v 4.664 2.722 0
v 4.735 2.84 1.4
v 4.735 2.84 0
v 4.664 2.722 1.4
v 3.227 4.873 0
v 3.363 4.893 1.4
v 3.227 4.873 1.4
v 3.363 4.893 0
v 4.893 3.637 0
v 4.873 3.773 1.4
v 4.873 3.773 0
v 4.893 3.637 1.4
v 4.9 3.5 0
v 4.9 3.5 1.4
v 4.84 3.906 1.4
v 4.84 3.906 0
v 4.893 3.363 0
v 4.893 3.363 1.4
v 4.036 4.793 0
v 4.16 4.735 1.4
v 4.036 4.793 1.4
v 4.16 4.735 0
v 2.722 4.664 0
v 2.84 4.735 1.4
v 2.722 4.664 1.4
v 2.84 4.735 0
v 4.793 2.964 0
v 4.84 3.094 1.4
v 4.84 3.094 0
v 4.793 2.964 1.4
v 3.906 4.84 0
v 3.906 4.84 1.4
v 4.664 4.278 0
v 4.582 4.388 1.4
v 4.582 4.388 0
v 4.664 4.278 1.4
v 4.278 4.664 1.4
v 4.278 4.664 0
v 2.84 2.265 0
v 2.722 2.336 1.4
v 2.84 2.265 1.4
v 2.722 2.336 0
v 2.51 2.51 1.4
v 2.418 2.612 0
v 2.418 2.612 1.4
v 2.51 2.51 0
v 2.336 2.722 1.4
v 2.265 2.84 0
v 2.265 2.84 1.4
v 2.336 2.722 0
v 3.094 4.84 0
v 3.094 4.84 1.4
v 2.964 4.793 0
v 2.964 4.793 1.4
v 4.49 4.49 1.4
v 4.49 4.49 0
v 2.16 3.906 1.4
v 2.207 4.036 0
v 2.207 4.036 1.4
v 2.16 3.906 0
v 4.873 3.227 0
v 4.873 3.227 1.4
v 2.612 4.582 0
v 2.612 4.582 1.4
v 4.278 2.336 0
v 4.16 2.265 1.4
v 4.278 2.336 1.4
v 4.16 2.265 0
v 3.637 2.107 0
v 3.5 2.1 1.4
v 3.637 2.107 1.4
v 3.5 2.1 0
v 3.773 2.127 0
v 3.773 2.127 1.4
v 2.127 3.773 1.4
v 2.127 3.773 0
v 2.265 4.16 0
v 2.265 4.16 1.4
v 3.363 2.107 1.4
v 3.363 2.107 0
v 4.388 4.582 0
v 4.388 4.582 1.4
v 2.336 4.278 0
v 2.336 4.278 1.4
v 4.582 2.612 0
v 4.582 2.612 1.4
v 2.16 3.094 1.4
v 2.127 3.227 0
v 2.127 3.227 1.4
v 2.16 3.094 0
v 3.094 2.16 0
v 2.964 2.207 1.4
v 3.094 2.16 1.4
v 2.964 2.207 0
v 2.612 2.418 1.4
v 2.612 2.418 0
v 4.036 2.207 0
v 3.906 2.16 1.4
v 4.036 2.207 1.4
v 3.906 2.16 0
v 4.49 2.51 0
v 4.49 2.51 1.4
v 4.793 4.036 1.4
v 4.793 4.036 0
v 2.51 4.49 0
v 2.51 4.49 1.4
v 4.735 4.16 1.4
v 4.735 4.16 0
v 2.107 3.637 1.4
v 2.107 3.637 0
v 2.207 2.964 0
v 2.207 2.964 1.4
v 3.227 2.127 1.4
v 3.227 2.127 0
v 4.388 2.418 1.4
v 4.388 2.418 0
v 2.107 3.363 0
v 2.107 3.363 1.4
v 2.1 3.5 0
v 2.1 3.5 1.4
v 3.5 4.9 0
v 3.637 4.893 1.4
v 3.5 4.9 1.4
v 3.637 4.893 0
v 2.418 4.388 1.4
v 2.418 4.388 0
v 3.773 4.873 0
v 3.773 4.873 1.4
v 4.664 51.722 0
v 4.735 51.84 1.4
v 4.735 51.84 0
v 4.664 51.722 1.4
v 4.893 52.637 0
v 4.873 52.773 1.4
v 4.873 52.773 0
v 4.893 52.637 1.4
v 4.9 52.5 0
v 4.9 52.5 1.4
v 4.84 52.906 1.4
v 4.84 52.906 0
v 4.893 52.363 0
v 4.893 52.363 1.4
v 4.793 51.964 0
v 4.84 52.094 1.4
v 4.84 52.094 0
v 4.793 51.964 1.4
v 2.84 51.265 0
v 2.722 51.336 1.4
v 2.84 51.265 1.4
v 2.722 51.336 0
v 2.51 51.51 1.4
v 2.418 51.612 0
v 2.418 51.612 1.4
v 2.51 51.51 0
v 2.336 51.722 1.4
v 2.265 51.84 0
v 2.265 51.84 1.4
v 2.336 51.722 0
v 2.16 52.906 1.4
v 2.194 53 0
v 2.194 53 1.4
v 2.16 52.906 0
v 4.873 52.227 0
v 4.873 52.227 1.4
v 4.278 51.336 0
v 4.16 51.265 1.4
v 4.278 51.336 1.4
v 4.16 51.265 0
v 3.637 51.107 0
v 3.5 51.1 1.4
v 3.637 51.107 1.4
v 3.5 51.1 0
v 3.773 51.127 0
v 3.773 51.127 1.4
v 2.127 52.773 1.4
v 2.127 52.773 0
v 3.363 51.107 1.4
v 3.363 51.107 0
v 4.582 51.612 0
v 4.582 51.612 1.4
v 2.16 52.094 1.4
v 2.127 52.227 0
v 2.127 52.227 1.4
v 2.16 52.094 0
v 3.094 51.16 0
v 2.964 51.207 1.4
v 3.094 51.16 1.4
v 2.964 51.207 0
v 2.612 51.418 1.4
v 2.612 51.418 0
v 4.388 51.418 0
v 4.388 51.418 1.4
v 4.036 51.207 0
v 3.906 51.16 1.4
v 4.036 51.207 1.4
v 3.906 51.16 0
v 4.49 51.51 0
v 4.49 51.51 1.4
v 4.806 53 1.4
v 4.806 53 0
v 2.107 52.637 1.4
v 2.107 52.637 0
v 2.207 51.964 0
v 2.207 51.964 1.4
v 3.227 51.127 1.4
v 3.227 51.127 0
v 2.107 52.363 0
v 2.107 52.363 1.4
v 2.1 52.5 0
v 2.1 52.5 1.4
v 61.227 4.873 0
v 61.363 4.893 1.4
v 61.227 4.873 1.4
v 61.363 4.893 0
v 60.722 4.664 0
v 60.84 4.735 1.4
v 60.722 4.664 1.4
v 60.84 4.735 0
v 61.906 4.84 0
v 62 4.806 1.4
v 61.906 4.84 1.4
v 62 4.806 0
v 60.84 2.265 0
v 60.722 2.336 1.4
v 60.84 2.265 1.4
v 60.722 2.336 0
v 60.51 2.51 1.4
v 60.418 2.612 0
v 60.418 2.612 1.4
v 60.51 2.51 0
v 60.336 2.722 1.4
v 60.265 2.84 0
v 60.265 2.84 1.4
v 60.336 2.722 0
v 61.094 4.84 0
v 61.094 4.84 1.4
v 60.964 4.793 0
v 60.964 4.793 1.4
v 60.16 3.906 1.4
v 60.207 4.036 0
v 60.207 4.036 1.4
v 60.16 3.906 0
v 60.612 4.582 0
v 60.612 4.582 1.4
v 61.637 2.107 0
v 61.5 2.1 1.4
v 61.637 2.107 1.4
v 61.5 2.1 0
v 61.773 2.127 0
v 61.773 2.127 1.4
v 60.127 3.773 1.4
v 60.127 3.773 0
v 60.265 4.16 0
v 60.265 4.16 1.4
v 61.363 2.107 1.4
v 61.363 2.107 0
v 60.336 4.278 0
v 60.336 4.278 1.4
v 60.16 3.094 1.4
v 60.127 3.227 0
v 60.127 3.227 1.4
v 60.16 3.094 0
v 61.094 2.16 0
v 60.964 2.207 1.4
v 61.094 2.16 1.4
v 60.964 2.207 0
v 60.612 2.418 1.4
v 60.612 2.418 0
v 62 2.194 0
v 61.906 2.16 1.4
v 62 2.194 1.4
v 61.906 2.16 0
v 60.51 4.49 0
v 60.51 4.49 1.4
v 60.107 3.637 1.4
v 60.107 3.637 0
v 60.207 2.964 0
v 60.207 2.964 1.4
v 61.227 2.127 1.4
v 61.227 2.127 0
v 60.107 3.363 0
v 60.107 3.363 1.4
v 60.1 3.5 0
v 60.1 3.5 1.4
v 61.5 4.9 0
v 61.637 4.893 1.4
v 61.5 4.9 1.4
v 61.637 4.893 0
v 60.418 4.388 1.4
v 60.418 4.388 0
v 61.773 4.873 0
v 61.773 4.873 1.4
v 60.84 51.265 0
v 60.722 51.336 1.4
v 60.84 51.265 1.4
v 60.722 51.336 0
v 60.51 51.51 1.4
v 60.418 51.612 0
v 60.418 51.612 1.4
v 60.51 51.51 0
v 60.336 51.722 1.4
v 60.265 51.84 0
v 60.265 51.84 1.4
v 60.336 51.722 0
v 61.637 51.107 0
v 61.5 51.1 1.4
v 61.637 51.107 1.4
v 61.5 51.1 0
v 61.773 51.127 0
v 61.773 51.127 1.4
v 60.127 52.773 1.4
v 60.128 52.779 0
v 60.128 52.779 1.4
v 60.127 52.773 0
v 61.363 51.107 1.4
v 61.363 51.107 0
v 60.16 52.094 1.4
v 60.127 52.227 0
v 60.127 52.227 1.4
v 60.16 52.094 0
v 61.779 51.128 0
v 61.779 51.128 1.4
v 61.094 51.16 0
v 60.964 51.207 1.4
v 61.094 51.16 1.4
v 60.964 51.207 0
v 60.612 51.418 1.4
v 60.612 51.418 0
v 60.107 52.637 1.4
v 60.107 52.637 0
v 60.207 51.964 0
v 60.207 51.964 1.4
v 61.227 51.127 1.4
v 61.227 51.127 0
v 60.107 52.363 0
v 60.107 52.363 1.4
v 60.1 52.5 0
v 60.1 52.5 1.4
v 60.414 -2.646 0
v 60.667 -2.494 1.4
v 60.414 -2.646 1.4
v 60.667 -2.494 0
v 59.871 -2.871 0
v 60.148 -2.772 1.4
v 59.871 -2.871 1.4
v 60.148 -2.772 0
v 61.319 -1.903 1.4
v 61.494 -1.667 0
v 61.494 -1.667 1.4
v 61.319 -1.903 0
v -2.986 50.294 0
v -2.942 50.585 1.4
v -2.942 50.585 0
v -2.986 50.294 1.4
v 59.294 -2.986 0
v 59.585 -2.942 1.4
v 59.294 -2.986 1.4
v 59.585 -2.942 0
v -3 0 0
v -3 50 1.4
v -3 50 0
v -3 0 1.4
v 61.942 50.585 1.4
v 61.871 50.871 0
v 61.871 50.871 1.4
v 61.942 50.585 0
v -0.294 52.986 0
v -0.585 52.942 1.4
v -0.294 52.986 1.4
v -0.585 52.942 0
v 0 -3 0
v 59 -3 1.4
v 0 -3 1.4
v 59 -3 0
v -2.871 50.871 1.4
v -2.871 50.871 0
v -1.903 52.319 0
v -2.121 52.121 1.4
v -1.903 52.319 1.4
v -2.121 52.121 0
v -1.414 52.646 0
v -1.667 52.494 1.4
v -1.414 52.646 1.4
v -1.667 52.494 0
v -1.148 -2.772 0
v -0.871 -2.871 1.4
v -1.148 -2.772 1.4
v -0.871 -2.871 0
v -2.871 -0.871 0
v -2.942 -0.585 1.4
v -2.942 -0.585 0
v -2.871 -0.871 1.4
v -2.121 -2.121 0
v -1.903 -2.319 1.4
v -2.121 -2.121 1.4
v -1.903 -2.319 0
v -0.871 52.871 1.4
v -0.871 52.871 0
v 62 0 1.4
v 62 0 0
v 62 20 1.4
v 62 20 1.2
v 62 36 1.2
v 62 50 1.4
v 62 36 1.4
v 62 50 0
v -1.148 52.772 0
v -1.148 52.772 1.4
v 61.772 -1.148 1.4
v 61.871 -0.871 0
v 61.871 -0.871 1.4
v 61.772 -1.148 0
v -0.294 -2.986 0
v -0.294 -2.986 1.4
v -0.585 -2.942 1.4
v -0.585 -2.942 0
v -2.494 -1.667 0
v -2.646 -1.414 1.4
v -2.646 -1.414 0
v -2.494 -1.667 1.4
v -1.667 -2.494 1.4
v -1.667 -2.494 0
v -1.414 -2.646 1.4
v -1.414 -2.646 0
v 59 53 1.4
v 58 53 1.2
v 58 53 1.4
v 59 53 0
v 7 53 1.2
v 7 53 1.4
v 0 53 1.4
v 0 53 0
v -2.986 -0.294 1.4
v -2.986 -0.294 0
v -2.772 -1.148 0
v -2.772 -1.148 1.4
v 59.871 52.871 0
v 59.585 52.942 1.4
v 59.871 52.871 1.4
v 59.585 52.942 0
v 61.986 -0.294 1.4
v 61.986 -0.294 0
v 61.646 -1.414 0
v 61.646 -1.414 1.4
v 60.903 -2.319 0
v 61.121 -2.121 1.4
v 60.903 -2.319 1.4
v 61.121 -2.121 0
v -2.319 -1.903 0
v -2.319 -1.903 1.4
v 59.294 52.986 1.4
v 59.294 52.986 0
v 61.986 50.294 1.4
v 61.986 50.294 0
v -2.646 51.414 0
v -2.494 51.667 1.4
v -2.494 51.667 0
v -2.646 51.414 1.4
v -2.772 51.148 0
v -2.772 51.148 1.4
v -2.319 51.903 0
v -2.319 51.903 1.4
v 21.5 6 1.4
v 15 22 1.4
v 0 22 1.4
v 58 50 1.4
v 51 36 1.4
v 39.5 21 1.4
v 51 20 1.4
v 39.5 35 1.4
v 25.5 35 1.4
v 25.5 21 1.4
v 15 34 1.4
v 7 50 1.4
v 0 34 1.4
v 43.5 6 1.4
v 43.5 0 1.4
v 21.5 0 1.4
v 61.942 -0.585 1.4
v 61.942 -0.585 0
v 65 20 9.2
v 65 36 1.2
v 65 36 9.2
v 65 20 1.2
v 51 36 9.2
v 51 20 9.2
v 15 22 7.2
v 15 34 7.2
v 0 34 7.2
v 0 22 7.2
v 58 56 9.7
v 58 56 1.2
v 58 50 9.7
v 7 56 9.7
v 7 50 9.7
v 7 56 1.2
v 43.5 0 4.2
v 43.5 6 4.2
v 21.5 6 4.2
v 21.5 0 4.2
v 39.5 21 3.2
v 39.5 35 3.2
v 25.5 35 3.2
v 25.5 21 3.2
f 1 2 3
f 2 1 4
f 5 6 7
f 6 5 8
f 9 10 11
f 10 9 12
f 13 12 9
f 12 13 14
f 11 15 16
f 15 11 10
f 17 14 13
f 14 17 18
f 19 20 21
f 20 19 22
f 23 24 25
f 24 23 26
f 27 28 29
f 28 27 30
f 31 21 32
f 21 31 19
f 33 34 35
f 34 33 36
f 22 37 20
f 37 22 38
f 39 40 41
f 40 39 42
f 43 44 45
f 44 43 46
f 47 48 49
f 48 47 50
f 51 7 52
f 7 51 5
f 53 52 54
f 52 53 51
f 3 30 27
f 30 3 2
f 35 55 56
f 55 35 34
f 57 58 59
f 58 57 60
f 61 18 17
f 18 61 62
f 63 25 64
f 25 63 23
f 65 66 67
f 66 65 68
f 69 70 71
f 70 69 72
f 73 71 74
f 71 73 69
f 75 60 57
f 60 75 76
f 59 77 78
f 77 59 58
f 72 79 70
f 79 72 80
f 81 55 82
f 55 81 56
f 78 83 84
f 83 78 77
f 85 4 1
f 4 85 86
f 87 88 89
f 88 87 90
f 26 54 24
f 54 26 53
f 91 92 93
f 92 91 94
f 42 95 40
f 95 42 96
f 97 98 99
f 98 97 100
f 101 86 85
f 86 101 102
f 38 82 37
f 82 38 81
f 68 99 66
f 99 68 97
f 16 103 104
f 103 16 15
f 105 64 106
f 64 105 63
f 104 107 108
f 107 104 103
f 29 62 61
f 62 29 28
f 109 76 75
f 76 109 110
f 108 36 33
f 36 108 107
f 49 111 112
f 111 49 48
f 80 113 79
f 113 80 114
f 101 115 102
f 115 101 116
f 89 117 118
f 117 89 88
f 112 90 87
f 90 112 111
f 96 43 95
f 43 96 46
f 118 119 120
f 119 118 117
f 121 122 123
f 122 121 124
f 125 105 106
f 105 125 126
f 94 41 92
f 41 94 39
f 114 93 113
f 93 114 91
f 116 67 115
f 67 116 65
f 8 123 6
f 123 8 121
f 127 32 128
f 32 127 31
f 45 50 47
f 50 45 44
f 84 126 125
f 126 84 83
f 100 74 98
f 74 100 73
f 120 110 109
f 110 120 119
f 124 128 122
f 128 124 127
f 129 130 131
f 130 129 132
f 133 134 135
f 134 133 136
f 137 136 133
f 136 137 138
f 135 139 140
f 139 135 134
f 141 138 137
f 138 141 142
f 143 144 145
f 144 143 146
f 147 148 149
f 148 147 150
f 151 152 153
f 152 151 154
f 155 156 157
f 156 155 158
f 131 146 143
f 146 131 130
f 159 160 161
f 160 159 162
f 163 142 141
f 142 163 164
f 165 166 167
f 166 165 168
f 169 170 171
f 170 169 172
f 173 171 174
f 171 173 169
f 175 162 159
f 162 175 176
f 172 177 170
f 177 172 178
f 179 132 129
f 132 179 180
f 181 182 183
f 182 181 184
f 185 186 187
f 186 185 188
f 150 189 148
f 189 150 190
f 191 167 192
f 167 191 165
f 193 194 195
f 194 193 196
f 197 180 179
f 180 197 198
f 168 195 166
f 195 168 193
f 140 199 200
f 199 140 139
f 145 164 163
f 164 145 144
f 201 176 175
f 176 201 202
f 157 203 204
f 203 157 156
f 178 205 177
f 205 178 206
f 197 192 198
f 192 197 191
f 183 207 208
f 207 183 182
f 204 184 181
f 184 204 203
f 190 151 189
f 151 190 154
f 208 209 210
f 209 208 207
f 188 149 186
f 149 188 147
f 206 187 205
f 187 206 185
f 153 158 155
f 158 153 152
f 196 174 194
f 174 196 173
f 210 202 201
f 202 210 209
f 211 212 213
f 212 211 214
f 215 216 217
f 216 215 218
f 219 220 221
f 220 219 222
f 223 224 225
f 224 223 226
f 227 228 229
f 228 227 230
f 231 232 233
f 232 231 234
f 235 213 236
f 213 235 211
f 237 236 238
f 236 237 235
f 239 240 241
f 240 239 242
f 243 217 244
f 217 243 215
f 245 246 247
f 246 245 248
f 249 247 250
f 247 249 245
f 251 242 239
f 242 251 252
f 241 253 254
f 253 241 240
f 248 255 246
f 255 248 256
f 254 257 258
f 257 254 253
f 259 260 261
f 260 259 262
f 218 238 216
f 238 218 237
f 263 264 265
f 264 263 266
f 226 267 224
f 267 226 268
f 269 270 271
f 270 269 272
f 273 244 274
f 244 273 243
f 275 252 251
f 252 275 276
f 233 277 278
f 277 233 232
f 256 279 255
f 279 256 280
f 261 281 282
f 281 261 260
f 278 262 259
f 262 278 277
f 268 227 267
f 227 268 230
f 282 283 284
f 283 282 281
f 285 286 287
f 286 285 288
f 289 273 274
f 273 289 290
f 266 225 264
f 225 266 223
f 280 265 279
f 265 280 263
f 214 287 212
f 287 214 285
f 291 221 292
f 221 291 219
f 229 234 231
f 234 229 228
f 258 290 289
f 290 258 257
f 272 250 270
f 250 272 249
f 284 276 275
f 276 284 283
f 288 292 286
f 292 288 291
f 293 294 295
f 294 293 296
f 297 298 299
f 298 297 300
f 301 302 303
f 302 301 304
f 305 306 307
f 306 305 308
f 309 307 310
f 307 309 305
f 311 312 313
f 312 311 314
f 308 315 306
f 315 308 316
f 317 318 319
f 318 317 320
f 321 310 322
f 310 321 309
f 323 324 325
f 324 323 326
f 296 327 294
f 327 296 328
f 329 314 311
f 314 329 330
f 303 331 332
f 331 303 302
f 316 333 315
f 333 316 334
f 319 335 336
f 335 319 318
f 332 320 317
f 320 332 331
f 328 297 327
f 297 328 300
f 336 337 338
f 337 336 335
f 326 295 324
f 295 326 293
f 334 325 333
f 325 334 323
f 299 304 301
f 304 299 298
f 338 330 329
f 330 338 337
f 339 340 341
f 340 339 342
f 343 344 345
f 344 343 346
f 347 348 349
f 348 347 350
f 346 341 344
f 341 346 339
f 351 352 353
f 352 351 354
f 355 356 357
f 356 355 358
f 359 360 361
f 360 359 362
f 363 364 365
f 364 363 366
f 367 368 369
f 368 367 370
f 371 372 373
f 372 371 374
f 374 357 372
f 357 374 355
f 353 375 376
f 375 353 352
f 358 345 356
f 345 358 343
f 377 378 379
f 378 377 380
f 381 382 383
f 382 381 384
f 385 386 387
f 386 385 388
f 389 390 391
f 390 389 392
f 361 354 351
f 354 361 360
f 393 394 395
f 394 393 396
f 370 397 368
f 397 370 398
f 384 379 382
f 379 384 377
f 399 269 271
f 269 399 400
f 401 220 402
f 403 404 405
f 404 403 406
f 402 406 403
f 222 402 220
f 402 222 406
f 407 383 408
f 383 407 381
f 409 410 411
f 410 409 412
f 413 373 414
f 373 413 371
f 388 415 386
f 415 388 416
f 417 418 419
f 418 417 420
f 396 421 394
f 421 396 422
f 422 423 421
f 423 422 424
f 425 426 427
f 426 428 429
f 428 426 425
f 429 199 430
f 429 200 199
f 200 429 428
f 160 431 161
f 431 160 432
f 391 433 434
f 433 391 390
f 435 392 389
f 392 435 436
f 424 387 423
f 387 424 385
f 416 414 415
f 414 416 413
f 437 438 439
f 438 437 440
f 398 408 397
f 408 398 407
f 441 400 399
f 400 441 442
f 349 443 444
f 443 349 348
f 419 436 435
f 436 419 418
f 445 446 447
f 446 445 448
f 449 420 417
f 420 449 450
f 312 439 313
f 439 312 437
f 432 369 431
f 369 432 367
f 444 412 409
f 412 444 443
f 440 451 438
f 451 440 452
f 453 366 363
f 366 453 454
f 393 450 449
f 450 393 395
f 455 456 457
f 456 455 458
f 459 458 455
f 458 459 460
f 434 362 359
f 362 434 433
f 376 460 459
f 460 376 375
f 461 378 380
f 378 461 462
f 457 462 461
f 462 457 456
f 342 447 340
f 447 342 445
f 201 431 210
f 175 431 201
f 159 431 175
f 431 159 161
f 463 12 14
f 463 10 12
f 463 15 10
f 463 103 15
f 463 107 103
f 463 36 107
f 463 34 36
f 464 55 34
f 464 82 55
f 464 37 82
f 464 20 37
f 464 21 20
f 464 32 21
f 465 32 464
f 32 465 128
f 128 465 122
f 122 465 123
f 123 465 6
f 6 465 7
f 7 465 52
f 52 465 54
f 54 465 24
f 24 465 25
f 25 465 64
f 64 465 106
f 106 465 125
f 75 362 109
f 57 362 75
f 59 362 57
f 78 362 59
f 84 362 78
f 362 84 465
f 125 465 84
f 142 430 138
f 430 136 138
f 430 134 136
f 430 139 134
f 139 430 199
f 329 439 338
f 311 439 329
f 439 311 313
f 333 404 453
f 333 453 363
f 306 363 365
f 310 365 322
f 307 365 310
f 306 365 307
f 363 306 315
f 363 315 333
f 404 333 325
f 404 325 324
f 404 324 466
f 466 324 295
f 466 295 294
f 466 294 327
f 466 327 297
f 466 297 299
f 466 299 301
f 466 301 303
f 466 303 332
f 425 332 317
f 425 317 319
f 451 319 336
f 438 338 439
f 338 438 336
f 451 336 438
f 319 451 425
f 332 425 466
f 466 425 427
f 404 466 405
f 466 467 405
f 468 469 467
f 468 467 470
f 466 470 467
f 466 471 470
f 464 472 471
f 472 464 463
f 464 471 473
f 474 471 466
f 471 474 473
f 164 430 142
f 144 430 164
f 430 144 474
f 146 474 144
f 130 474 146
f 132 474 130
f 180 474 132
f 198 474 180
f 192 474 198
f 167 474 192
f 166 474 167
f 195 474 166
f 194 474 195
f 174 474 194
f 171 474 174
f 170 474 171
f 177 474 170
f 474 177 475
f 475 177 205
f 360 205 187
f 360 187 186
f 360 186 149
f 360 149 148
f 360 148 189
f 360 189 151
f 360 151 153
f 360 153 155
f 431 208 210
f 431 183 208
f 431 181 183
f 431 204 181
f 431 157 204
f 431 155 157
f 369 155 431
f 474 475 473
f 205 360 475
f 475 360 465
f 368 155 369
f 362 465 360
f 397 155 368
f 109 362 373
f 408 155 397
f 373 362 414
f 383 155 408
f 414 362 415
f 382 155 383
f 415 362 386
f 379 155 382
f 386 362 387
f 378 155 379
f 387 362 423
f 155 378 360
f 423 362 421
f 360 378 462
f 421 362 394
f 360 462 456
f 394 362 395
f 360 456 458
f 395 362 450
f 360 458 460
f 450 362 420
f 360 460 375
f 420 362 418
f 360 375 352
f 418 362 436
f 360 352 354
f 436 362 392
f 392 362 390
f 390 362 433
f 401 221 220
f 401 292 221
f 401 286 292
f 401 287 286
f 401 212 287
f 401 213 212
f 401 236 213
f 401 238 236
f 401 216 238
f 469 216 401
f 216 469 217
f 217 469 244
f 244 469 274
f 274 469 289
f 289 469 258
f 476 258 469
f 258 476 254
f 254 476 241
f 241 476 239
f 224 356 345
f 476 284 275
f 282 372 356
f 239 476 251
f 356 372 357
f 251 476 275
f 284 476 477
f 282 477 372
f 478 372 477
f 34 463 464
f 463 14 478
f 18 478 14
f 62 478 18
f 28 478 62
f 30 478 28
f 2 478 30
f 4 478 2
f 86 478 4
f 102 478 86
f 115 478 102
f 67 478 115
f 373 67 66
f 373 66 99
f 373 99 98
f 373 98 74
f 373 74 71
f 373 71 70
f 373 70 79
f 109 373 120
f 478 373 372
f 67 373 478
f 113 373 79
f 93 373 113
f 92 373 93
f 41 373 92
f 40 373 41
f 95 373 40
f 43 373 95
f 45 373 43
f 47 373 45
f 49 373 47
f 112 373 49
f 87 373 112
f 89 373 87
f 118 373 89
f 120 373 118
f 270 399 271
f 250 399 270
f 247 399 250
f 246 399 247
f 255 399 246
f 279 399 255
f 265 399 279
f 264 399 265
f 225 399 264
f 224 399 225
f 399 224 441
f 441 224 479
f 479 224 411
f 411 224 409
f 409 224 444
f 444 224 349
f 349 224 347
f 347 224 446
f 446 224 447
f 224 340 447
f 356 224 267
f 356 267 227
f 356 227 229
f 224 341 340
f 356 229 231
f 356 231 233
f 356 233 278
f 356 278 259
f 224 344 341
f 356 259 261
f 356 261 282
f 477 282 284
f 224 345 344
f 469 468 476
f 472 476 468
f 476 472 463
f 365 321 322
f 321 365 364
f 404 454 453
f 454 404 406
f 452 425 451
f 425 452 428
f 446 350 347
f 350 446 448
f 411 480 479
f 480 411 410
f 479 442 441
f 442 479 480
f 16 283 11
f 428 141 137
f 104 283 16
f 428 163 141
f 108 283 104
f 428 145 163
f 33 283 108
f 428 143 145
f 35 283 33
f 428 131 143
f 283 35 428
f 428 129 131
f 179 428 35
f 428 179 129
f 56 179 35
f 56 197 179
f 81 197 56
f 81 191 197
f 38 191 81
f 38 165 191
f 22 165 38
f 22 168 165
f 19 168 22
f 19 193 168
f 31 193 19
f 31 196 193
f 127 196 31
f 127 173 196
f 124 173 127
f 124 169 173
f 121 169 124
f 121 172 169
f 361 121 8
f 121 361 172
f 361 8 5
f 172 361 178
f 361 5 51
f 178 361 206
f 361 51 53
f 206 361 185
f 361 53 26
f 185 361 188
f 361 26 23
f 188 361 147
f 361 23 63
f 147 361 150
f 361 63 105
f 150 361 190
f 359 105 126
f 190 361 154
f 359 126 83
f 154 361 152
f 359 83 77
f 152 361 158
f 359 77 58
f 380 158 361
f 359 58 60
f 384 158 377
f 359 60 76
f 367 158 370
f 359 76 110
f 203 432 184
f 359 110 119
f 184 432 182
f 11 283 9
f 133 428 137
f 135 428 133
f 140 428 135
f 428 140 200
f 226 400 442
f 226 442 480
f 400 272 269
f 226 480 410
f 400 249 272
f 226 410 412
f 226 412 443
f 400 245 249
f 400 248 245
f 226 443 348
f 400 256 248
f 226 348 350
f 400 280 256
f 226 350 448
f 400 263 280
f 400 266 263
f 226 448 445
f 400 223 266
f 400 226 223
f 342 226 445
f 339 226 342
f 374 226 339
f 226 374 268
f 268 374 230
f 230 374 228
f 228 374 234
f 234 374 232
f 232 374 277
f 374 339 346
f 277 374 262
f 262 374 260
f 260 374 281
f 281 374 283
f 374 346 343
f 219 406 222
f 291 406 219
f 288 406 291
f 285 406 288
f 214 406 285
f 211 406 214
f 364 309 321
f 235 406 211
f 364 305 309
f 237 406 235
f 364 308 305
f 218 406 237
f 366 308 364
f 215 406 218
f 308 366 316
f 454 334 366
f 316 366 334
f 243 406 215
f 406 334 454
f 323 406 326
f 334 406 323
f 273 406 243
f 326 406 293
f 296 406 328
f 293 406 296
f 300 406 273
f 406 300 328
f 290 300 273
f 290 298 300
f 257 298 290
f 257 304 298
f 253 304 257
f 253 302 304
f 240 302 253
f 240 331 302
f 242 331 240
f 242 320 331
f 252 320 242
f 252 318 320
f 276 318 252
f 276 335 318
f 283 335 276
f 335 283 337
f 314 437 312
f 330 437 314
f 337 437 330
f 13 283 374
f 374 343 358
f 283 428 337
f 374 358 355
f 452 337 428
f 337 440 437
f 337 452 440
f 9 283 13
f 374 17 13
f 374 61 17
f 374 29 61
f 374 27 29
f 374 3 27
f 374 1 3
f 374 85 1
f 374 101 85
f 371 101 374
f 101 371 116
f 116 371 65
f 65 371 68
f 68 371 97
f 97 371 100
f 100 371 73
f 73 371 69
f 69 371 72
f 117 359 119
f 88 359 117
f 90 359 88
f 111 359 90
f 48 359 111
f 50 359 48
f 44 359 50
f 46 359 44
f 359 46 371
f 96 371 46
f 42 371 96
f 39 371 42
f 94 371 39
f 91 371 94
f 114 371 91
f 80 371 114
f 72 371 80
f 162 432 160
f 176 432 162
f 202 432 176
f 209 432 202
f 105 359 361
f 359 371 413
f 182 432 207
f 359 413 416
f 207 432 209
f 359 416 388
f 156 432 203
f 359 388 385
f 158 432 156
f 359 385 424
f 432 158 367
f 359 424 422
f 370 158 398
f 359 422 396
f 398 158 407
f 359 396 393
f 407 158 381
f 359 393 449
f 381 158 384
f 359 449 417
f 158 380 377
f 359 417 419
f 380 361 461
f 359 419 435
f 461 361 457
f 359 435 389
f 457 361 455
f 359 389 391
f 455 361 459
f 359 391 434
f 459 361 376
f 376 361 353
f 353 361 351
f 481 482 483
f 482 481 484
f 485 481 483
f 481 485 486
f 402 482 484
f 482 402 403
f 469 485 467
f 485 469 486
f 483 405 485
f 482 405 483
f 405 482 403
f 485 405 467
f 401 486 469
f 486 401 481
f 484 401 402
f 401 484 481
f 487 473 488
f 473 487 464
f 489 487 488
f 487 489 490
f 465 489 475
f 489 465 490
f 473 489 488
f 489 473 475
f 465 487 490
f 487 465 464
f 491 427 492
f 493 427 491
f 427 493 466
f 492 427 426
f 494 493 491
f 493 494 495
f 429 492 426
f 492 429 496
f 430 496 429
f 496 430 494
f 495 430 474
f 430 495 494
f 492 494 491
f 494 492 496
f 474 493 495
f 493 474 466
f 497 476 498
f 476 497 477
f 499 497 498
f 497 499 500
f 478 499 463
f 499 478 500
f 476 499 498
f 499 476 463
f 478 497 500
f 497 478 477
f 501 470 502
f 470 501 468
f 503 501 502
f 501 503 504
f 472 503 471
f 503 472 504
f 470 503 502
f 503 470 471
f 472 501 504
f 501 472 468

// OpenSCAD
$fn = 64;

// Single-board computer overall size (PCB)
board_x = 65.0;
board_y = 56.0;
board_z = 1.4;

// Small overlap to guarantee connectivity between parts
overlap = 0.2;

// Helper: rounded rectangle prism (for PCB with rounded corners)
module rounded_box(size=[10,10,1], r=2, center=false) {
    x = size[0]; y = size[1]; z = size[2];
    translate(center ? [-x/2, -y/2, -z/2] : [0,0,0])
        linear_extrude(height=z)
            offset(r=r)
                square([x-2*r, y-2*r], center=false);
}

// Helper: place a part on top of the PCB with slight overlap
module on_top(h) {
    translate([0, 0, board_z - overlap]) children();
}

// PCB corner radius
pcb_r = 3.0;

// Mounting holes (typical SBC style) - cut through PCB
hole_d = 2.8;
hole_edge_x = 3.5;
hole_edge_y = 3.5;

// Connector/component approximations (kept within board outline)
usb_w = 14.0;   // along X
usb_d = 16.0;   // along Y (inward from edge)
usb_h = 8.0;

hdmi_w = 15.0;
hdmi_d = 12.0;
hdmi_h = 6.0;

gpio_w = 51.0;
gpio_d = 6.0;
gpio_h = 8.5;

chip_w = 14.0;
chip_d = 14.0;
chip_h = 2.0;

cam_w = 22.0;
cam_d = 6.0;
cam_h = 3.0;

union() {
    // PCB with mounting holes
    difference() {
        rounded_box([board_x, board_y, board_z], r=pcb_r, center=false);

        // 4 mounting holes
        for (px = [hole_edge_x, board_x - hole_edge_x])
            for (py = [hole_edge_y, board_y - hole_edge_y])
                translate([px, py, -0.1])
                    cylinder(d=hole_d, h=board_z + 0.2, center=false);
    }

    // Components/connectors on top (all connected via overlap)
    on_top(0) {
        // USB connector on right edge
        translate([board_x - usb_w, (board_y - usb_d)/2, 0])
            cube([usb_w, usb_d, usb_h], center=false);

        // HDMI connector on left edge
        translate([0, (board_y - hdmi_d)/2, 0])
            cube([hdmi_w, hdmi_d, hdmi_h], center=false);

        // GPIO header along top edge
        translate([(board_x - gpio_w)/2, board_y - gpio_d, 0])
            cube([gpio_w, gpio_d, gpio_h], center=false);

        // Camera/FFC connector along bottom edge
        translate([(board_x - cam_w)/2, 0, 0])
            cube([cam_w, cam_d, cam_h], center=false);

        // Main chip near center
        translate([(board_x - chip_w)/2, (board_y - chip_d)/2, 0])
            cube([chip_w, chip_d, chip_h], center=false);
    }
}
